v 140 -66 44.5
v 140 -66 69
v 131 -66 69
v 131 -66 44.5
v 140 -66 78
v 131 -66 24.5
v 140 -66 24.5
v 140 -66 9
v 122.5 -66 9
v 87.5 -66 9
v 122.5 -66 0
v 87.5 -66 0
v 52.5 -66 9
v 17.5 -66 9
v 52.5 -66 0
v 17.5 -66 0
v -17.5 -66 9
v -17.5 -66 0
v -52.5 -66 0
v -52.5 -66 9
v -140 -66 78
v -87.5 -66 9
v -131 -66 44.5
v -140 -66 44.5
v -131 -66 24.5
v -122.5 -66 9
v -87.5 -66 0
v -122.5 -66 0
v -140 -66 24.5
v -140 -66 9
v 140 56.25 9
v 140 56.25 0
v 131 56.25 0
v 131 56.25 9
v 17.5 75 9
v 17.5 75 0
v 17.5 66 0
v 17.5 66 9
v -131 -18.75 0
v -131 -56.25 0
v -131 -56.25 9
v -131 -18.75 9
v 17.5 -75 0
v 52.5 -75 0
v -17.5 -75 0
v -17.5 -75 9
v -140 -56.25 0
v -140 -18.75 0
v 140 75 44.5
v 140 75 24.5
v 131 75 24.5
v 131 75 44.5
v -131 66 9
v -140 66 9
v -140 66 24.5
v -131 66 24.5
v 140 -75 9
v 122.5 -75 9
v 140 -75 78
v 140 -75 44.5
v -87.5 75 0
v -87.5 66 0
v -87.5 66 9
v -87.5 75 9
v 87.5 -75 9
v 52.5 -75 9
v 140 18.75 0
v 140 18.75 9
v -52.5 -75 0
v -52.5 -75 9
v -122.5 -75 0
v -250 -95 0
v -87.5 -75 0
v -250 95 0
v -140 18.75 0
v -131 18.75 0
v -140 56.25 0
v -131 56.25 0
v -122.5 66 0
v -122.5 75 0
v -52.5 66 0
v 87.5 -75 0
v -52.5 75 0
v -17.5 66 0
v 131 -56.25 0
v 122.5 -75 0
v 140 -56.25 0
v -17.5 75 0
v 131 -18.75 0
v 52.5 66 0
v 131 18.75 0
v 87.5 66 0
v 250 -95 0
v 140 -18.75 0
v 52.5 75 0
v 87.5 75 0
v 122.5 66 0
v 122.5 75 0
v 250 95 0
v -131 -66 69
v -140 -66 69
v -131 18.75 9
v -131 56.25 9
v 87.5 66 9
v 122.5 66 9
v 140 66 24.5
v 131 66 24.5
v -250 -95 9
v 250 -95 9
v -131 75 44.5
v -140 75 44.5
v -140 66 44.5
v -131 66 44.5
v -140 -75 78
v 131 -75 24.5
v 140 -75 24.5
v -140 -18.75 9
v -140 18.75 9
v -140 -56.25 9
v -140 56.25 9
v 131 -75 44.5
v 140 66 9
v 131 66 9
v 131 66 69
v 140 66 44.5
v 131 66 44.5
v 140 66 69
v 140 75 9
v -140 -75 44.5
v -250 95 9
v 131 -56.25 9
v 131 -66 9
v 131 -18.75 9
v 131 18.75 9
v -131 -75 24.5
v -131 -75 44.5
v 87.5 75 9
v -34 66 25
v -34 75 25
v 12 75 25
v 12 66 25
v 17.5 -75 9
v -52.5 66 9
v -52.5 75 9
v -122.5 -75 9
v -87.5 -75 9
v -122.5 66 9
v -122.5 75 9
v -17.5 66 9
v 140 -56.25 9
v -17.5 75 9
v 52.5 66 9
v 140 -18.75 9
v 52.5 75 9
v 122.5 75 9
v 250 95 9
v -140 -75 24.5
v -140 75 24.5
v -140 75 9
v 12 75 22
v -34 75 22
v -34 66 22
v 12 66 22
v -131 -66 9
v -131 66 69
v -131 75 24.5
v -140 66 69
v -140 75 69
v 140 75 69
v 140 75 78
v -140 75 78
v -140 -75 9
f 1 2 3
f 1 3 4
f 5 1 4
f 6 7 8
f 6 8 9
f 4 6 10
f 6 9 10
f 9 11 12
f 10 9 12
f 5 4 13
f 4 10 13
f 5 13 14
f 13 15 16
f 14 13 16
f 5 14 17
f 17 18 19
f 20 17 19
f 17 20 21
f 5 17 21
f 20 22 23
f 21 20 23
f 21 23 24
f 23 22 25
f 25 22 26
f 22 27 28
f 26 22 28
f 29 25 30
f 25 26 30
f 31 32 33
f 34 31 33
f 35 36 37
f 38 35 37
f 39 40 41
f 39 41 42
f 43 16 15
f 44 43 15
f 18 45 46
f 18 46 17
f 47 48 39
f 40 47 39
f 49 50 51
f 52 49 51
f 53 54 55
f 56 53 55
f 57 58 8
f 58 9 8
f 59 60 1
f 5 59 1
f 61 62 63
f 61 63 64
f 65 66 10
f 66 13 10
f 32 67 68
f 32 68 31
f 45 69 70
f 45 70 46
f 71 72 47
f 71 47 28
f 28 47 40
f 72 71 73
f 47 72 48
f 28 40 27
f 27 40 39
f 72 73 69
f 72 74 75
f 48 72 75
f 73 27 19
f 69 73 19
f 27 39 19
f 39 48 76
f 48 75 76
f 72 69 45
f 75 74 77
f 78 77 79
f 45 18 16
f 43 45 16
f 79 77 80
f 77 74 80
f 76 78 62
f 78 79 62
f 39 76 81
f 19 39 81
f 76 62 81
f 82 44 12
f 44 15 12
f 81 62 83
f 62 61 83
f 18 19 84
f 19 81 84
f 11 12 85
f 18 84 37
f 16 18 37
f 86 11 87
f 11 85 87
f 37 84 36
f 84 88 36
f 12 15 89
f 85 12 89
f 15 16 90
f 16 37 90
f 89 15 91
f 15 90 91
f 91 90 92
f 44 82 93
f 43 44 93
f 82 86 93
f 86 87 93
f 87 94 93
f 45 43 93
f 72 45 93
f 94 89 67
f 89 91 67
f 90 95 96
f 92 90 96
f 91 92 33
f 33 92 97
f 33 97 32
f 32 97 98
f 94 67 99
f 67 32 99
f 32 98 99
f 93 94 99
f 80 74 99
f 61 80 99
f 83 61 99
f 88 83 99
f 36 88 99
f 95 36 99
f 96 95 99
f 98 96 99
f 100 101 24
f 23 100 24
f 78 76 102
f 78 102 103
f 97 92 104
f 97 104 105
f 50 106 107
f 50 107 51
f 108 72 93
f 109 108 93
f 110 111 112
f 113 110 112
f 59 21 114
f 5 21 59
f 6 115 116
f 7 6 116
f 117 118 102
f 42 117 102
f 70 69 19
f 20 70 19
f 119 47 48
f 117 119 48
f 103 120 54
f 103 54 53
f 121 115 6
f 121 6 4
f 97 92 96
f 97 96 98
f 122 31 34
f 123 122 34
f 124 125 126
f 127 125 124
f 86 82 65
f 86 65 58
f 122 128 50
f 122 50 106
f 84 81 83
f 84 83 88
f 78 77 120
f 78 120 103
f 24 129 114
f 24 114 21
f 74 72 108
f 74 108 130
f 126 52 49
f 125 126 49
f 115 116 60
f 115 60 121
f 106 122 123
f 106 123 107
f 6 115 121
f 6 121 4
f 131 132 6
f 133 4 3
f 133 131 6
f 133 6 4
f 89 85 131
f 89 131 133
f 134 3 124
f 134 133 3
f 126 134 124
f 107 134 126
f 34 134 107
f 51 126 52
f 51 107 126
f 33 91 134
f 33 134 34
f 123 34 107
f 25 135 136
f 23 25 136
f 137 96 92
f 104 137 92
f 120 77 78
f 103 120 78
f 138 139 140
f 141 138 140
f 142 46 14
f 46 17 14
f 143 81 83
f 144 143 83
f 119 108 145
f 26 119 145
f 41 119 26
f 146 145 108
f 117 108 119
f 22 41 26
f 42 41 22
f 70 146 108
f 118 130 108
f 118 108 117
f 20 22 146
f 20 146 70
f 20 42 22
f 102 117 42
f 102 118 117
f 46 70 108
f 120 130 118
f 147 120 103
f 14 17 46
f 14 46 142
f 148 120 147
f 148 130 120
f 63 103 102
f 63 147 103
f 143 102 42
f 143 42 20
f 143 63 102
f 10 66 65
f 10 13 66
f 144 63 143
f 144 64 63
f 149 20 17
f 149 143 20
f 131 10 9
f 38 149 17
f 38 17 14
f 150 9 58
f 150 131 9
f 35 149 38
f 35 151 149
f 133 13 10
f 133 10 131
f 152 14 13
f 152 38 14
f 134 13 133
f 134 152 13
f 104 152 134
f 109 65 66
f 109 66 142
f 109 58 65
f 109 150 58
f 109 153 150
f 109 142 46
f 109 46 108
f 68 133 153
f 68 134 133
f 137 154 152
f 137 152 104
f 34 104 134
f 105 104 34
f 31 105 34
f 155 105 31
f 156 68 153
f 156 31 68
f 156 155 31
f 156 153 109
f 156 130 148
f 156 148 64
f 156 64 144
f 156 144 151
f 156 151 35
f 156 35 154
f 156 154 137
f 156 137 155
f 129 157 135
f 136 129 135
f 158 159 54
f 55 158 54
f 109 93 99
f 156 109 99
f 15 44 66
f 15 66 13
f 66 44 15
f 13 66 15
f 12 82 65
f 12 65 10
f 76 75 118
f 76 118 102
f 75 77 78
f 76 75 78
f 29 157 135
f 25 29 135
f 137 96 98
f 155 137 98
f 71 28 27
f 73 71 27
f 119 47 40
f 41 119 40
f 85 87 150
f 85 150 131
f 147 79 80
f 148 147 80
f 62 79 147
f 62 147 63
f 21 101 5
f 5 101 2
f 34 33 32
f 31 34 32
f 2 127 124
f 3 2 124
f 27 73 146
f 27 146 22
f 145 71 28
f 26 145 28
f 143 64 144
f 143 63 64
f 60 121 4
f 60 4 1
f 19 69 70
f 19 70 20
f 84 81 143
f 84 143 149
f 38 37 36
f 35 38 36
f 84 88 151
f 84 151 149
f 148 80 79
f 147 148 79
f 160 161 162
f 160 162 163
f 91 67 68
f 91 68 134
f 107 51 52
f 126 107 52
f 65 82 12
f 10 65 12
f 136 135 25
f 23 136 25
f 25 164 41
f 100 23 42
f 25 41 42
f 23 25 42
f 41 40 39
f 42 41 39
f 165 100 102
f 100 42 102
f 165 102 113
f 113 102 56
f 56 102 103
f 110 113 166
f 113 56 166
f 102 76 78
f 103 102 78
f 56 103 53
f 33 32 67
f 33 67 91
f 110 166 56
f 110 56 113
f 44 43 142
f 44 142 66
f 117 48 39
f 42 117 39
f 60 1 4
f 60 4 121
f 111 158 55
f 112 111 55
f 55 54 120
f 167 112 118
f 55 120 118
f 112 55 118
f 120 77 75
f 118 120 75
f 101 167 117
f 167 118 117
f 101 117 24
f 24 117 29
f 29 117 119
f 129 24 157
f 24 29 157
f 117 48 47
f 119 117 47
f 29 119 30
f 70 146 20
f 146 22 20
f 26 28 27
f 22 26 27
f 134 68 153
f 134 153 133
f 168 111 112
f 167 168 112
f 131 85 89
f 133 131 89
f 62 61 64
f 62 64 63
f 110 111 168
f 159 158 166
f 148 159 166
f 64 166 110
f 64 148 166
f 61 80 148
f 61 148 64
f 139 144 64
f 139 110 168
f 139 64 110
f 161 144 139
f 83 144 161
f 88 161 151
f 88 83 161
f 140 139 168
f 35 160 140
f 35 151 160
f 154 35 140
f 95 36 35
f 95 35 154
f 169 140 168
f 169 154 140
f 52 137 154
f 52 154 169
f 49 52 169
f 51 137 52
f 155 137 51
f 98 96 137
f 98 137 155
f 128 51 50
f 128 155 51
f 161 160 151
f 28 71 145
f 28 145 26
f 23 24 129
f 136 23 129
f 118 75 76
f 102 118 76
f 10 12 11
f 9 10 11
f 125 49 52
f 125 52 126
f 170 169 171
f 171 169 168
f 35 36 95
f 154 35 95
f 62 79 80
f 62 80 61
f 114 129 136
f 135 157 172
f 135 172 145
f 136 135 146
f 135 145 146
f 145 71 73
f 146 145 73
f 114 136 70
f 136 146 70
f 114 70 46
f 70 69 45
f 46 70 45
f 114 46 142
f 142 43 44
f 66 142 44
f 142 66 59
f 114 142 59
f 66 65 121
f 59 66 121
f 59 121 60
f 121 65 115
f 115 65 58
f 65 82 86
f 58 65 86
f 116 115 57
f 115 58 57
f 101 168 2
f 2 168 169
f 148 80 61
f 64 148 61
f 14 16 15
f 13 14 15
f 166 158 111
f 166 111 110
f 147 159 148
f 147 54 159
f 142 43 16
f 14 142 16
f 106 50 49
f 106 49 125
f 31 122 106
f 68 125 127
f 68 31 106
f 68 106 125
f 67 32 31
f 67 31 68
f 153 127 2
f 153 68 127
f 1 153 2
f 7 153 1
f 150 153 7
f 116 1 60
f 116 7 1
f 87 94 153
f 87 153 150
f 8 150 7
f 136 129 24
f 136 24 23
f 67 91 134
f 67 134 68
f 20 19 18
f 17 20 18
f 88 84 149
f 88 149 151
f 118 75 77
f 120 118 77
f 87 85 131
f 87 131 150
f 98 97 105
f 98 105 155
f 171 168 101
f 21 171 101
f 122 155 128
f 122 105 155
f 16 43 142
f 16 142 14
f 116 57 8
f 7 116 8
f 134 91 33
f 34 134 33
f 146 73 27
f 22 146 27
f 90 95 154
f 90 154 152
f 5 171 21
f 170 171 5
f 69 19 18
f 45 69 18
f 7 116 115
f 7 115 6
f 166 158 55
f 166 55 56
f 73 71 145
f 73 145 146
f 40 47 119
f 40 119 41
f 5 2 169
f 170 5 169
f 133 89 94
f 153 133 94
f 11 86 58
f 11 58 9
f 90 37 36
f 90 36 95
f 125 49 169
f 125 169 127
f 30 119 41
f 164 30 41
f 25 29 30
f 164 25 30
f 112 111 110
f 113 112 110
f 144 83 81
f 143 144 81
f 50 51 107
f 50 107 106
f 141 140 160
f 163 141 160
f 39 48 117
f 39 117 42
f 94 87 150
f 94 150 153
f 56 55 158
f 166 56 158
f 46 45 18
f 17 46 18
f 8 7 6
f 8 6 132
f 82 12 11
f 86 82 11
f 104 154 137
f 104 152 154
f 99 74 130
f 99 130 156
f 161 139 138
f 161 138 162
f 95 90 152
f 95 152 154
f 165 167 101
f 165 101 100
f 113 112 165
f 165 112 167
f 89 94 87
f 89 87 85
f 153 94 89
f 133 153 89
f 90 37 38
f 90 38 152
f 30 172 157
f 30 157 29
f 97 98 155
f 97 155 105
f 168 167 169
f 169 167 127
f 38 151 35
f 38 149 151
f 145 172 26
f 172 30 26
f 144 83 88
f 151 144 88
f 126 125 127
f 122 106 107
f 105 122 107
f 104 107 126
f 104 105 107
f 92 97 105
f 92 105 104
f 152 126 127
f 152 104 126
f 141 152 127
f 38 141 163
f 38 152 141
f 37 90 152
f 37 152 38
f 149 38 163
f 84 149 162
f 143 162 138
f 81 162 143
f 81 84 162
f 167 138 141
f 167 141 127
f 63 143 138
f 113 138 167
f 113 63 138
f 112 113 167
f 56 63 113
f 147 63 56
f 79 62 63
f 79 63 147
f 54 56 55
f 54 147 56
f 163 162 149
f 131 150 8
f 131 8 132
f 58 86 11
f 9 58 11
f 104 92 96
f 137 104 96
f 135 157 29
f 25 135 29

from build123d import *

# Parameters (mm, degrees)
ESQUISSE1_W             = 500
ESQUISSE1_H             = 190
ESQUISSE1_W_2           = 9
ESQUISSE1_H_2           = 37.5
ESQUISSE1_W_3           = 35
ESQUISSE1_H_3           = 9
BOSS_EXTRU_1_DEPTH      = 9
BOSS_EXTRU_2_START      = 9
ESQUISSE1_5_W           = 9
ESQUISSE1_5_H           = 9
ESQUISSE1_5_H_2         = 9.75
ESQUISSE1_5_H_3         = 37.5
BOSS_EXTRU_2_DEPTH      = 60
ESQUISSE1_6_W           = 9
ESQUISSE1_6_H           = 37.5
BOSS_EXTRU_3_DEPTH      = 9
ESQUISSE2_W             = 15.5
ESQUISSE2_H             = 9
ESQUISSE2_W_2           = 9
ENL_V_MAT_EXTRU_1_DEPTH = 408.291050724
BOSS_EXTRU_4_START      = 9
ESQUISSE1_7_W           = 35
ESQUISSE1_7_H           = 9
ESQUISSE1_7_W_2         = 8.5
ESQUISSE1_7_W_3         = 9
BOSS_EXTRU_4_DEPTH      = 60
ESQUISSE1_8_W           = 35
ESQUISSE1_8_H           = 9
BOSS_EXTRU_5_DEPTH      = 9
ESQUISSE3_W             = 9
ESQUISSE3_H             = 20
ENL_V_MAT_EXTRU_2_DEPTH = 311.098371489
BOSS_EXTRU_6_START      = 69
ESQUISSE1_9_W           = 9
ESQUISSE1_9_H           = 9
ESQUISSE1_9_W_2         = 8.5
ESQUISSE1_9_W_3         = 35
BOSS_EXTRU_6_DEPTH      = 9
BOSS_EXTRU_7_START      = 69
ESQUISSE1_10_W          = 262
ESQUISSE1_10_H          = 132
ESQUISSE1_10_W_2        = 9
ESQUISSE1_10_H_2        = 9.75
ESQUISSE1_10_H_3        = 37.5
ESQUISSE1_10_H_4        = 9
ESQUISSE1_10_W_3        = 8.5
ESQUISSE1_10_W_4        = 35
BOSS_EXTRU_7_DEPTH      = 9
ESQUISSE4_W             = 46
ESQUISSE4_H             = 3
ENL_V_MAT_EXTRU_3_DEPTH = 10


with BuildPart() as part:
    # Esquisse1 → Boss.-Extru.1 (new body)
    with BuildSketch(Plane.XY):
        Rectangle(ESQUISSE1_W, ESQUISSE1_H)
        with Locations((-135.5, 37.5)):
            Rectangle(ESQUISSE1_W_2, ESQUISSE1_H_2, mode=Mode.SUBTRACT)
        with Locations((-135.5, -37.5)):
            Rectangle(ESQUISSE1_W_2, ESQUISSE1_H_2, mode=Mode.SUBTRACT)
        with Locations((-105, -70.5)):
            Rectangle(ESQUISSE1_W_3, ESQUISSE1_H_3, mode=Mode.SUBTRACT)
        with Locations((-35, -70.5)):
            Rectangle(ESQUISSE1_W_3, ESQUISSE1_H_3, mode=Mode.SUBTRACT)
        with Locations((35, -70.5)):
            Rectangle(ESQUISSE1_W_3, ESQUISSE1_H_3, mode=Mode.SUBTRACT)
        with Locations((105, -70.5)):
            Rectangle(ESQUISSE1_W_3, ESQUISSE1_H_3, mode=Mode.SUBTRACT)
        with Locations((135.5, -37.5)):
            Rectangle(ESQUISSE1_W_2, ESQUISSE1_H_2, mode=Mode.SUBTRACT)
        with Locations((135.5, 37.5)):
            Rectangle(ESQUISSE1_W_2, ESQUISSE1_H_2, mode=Mode.SUBTRACT)
        with Locations((105, 70.5)):
            Rectangle(ESQUISSE1_W_3, ESQUISSE1_H_3, mode=Mode.SUBTRACT)
        with Locations((35, 70.5)):
            Rectangle(ESQUISSE1_W_3, ESQUISSE1_H_3, mode=Mode.SUBTRACT)
        with Locations((-35, 70.5)):
            Rectangle(ESQUISSE1_W_3, ESQUISSE1_H_3, mode=Mode.SUBTRACT)
        with Locations((-105, 70.5)):
            Rectangle(ESQUISSE1_W_3, ESQUISSE1_H_3, mode=Mode.SUBTRACT)
    extrude(amount=BOSS_EXTRU_1_DEPTH)


with BuildPart() as body_2:
    # Esquisse1<5> → Boss.-Extru.2 (new body)
    with BuildSketch(Plane.XY.offset(BOSS_EXTRU_2_START)):
        with Locations((-135.5, 70.5)):
            Rectangle(ESQUISSE1_5_W, ESQUISSE1_5_H)
        with Locations((-135.5, 61.125)):
            Rectangle(ESQUISSE1_5_W, ESQUISSE1_5_H_2)
        with Locations((-135.5, 37.5)):
            Rectangle(ESQUISSE1_5_W, ESQUISSE1_5_H_3)
        with Locations((-135.5, 0)):
            Rectangle(ESQUISSE1_5_W, ESQUISSE1_5_H_3)
        with Locations((-135.5, -37.5)):
            Rectangle(ESQUISSE1_5_W, ESQUISSE1_5_H_3)
        with Locations((-135.5, -61.125)):
            Rectangle(ESQUISSE1_5_W, ESQUISSE1_5_H_2)
        with Locations((-135.5, -70.5)):
            Rectangle(ESQUISSE1_5_W, ESQUISSE1_5_H)
    extrude(amount=BOSS_EXTRU_2_DEPTH)

    # Esquisse1<6> → Boss.-Extru.3 (add)
    with BuildSketch(Plane.XY):
        with Locations((-135.5, 37.5)):
            Rectangle(ESQUISSE1_6_W, ESQUISSE1_6_H)
        with Locations((-135.5, -37.5)):
            Rectangle(ESQUISSE1_6_W, ESQUISSE1_6_H)
    extrude(amount=BOSS_EXTRU_3_DEPTH)

    # Esquisse2 → Enlèv. mat.-Extru.1 (cut, through all)
    with BuildSketch(Plane.ZY.offset(140)):
        with Locations((16.75, 70.5)):
            Rectangle(ESQUISSE2_W, ESQUISSE2_H)
        with Locations((4.5, 70.5)):
            Rectangle(ESQUISSE2_W_2, ESQUISSE2_H)
        Polygon((44.5, 75), (44.5, 66), (60, 66), (69, 66), (69, 75), align=None)
        Polygon((69, -66), (60, -66), (44.5, -66), (44.5, -75), (69, -75), align=None)
        with Locations((16.75, -70.5)):
            Rectangle(ESQUISSE2_W, ESQUISSE2_H)
        with Locations((4.5, -70.5)):
            Rectangle(ESQUISSE2_W_2, ESQUISSE2_H)
    extrude(amount=-ENL_V_MAT_EXTRU_1_DEPTH, mode=Mode.SUBTRACT)


with BuildPart() as body_3:
    # Symétrie1: mirrored copy
    add(body_2.part.mirror(Plane(origin=(0, 0, 0), x_dir=(0, 0, 1), z_dir=(1, 0, 0))))


with BuildPart() as body_4:
    # Esquisse1<7> → Boss.-Extru.4 (new body)
    with BuildSketch(Plane.XY.offset(BOSS_EXTRU_4_START)):
        with Locations((-70, -70.5)):
            Rectangle(ESQUISSE1_7_W, ESQUISSE1_7_H)
        with Locations((-35, -70.5)):
            Rectangle(ESQUISSE1_7_W, ESQUISSE1_7_H)
        with Locations((0, -70.5)):
            Rectangle(ESQUISSE1_7_W, ESQUISSE1_7_H)
        with Locations((35, -70.5)):
            Rectangle(ESQUISSE1_7_W, ESQUISSE1_7_H)
        with Locations((70, -70.5)):
            Rectangle(ESQUISSE1_7_W, ESQUISSE1_7_H)
        with Locations((105, -70.5)):
            Rectangle(ESQUISSE1_7_W, ESQUISSE1_7_H)
        with Locations((126.75, -70.5)):
            Rectangle(ESQUISSE1_7_W_2, ESQUISSE1_7_H)
        with Locations((135.5, -70.5)):
            Rectangle(ESQUISSE1_7_W_3, ESQUISSE1_7_H)
        with Locations((-105, -70.5)):
            Rectangle(ESQUISSE1_7_W, ESQUISSE1_7_H)
        with Locations((-126.75, -70.5)):
            Rectangle(ESQUISSE1_7_W_2, ESQUISSE1_7_H)
        with Locations((-135.5, -70.5)):
            Rectangle(ESQUISSE1_7_W_3, ESQUISSE1_7_H)
    extrude(amount=BOSS_EXTRU_4_DEPTH)

    # Esquisse1<8> → Boss.-Extru.5 (add)
    with BuildSketch(Plane.XY):
        with Locations((-105, -70.5)):
            Rectangle(ESQUISSE1_8_W, ESQUISSE1_8_H)
        with Locations((-35, -70.5)):
            Rectangle(ESQUISSE1_8_W, ESQUISSE1_8_H)
        with Locations((35, -70.5)):
            Rectangle(ESQUISSE1_8_W, ESQUISSE1_8_H)
        with Locations((105, -70.5)):
            Rectangle(ESQUISSE1_8_W, ESQUISSE1_8_H)
    extrude(amount=BOSS_EXTRU_5_DEPTH)

    # Esquisse3 → Enlèv. mat.-Extru.2 (cut, through all)
    with BuildSketch(Plane.XZ.offset(75)):
        with Locations((-135.5, 34.5)):
            Rectangle(ESQUISSE3_W, ESQUISSE3_H)
        with Locations((135.5, 34.5)):
            Rectangle(ESQUISSE3_W, ESQUISSE3_H)
    extrude(amount=-ENL_V_MAT_EXTRU_2_DEPTH, mode=Mode.SUBTRACT)


with BuildPart() as body_5:
    # Symétrie2: mirrored copy
    add(body_4.part.mirror(Plane.ZX))

    # Esquisse4 → Enlèv. mat.-Extru.3 (cut)
    with BuildSketch(Plane(origin=(0, 75, 0), x_dir=(1, 0, 0), z_dir=(0, 1, 0))):
        with Locations((-11, -23.5)):
            Rectangle(ESQUISSE4_W, ESQUISSE4_H)
    extrude(amount=-ENL_V_MAT_EXTRU_3_DEPTH, mode=Mode.SUBTRACT)


with BuildPart() as body_4_1:
    add(body_4.part)

    # Esquisse1<9> → Boss.-Extru.6 (add)
    with BuildSketch(Plane.XY.offset(BOSS_EXTRU_6_START)):
        with Locations((135.5, -70.5)):
            Rectangle(ESQUISSE1_9_W, ESQUISSE1_9_H)
        with Locations((126.75, -70.5)):
            Rectangle(ESQUISSE1_9_W_2, ESQUISSE1_9_H)
        with Locations((105, -70.5)):
            Rectangle(ESQUISSE1_9_W_3, ESQUISSE1_9_H)
        with Locations((70, -70.5)):
            Rectangle(ESQUISSE1_9_W_3, ESQUISSE1_9_H)
        with Locations((35, -70.5)):
            Rectangle(ESQUISSE1_9_W_3, ESQUISSE1_9_H)
        with Locations((0, -70.5)):
            Rectangle(ESQUISSE1_9_W_3, ESQUISSE1_9_H)
        with Locations((-35, -70.5)):
            Rectangle(ESQUISSE1_9_W_3, ESQUISSE1_9_H)
        with Locations((-70, -70.5)):
            Rectangle(ESQUISSE1_9_W_3, ESQUISSE1_9_H)
        with Locations((-105, -70.5)):
            Rectangle(ESQUISSE1_9_W_3, ESQUISSE1_9_H)
        with Locations((-126.75, -70.5)):
            Rectangle(ESQUISSE1_9_W_2, ESQUISSE1_9_H)
        with Locations((-135.5, -70.5)):
            Rectangle(ESQUISSE1_9_W, ESQUISSE1_9_H)
    extrude(amount=BOSS_EXTRU_6_DEPTH)


with BuildPart() as body_6:
    # Esquisse1<10> → Boss.-Extru.7 (new body)
    with BuildSketch(Plane.XY.offset(BOSS_EXTRU_7_START)):
        Rectangle(ESQUISSE1_10_W, ESQUISSE1_10_H)
        with Locations((135.5, -61.125)):
            Rectangle(ESQUISSE1_10_W_2, ESQUISSE1_10_H_2)
        with Locations((135.5, -37.5)):
            Rectangle(ESQUISSE1_10_W_2, ESQUISSE1_10_H_3)
        with Locations((135.5, 0)):
            Rectangle(ESQUISSE1_10_W_2, ESQUISSE1_10_H_3)
        with Locations((135.5, 37.5)):
            Rectangle(ESQUISSE1_10_W_2, ESQUISSE1_10_H_3)
        with Locations((135.5, 70.5)):
            Rectangle(ESQUISSE1_10_W_2, ESQUISSE1_10_H_4)
        with Locations((126.75, 70.5)):
            Rectangle(ESQUISSE1_10_W_3, ESQUISSE1_10_H_4)
        with Locations((105, 70.5)):
            Rectangle(ESQUISSE1_10_W_4, ESQUISSE1_10_H_4)
        with Locations((70, 70.5)):
            Rectangle(ESQUISSE1_10_W_4, ESQUISSE1_10_H_4)
        with Locations((35, 70.5)):
            Rectangle(ESQUISSE1_10_W_4, ESQUISSE1_10_H_4)
        with Locations((0, 70.5)):
            Rectangle(ESQUISSE1_10_W_4, ESQUISSE1_10_H_4)
        with Locations((-35, 70.5)):
            Rectangle(ESQUISSE1_10_W_4, ESQUISSE1_10_H_4)
        with Locations((-70, 70.5)):
            Rectangle(ESQUISSE1_10_W_4, ESQUISSE1_10_H_4)
        with Locations((-105, 70.5)):
            Rectangle(ESQUISSE1_10_W_4, ESQUISSE1_10_H_4)
        with Locations((-135.5, 70.5)):
            Rectangle(ESQUISSE1_10_W_2, ESQUISSE1_10_H_4)
        with Locations((-135.5, 61.125)):
            Rectangle(ESQUISSE1_10_W_2, ESQUISSE1_10_H_2)
        with Locations((-126.75, 70.5)):
            Rectangle(ESQUISSE1_10_W_3, ESQUISSE1_10_H_4)
        with Locations((-135.5, 37.5)):
            Rectangle(ESQUISSE1_10_W_2, ESQUISSE1_10_H_3)
        with Locations((-135.5, 0)):
            Rectangle(ESQUISSE1_10_W_2, ESQUISSE1_10_H_3)
        with Locations((-135.5, -37.5)):
            Rectangle(ESQUISSE1_10_W_2, ESQUISSE1_10_H_3)
        with Locations((-135.5, -61.125)):
            Rectangle(ESQUISSE1_10_W_2, ESQUISSE1_10_H_2)
        with Locations((135.5, 61.125)):
            Rectangle(ESQUISSE1_10_W_2, ESQUISSE1_10_H_2)
    extrude(amount=BOSS_EXTRU_7_DEPTH)


solid = Compound([part.part, body_2.part, body_3.part, body_5.part, body_4_1.part, body_6.part])
